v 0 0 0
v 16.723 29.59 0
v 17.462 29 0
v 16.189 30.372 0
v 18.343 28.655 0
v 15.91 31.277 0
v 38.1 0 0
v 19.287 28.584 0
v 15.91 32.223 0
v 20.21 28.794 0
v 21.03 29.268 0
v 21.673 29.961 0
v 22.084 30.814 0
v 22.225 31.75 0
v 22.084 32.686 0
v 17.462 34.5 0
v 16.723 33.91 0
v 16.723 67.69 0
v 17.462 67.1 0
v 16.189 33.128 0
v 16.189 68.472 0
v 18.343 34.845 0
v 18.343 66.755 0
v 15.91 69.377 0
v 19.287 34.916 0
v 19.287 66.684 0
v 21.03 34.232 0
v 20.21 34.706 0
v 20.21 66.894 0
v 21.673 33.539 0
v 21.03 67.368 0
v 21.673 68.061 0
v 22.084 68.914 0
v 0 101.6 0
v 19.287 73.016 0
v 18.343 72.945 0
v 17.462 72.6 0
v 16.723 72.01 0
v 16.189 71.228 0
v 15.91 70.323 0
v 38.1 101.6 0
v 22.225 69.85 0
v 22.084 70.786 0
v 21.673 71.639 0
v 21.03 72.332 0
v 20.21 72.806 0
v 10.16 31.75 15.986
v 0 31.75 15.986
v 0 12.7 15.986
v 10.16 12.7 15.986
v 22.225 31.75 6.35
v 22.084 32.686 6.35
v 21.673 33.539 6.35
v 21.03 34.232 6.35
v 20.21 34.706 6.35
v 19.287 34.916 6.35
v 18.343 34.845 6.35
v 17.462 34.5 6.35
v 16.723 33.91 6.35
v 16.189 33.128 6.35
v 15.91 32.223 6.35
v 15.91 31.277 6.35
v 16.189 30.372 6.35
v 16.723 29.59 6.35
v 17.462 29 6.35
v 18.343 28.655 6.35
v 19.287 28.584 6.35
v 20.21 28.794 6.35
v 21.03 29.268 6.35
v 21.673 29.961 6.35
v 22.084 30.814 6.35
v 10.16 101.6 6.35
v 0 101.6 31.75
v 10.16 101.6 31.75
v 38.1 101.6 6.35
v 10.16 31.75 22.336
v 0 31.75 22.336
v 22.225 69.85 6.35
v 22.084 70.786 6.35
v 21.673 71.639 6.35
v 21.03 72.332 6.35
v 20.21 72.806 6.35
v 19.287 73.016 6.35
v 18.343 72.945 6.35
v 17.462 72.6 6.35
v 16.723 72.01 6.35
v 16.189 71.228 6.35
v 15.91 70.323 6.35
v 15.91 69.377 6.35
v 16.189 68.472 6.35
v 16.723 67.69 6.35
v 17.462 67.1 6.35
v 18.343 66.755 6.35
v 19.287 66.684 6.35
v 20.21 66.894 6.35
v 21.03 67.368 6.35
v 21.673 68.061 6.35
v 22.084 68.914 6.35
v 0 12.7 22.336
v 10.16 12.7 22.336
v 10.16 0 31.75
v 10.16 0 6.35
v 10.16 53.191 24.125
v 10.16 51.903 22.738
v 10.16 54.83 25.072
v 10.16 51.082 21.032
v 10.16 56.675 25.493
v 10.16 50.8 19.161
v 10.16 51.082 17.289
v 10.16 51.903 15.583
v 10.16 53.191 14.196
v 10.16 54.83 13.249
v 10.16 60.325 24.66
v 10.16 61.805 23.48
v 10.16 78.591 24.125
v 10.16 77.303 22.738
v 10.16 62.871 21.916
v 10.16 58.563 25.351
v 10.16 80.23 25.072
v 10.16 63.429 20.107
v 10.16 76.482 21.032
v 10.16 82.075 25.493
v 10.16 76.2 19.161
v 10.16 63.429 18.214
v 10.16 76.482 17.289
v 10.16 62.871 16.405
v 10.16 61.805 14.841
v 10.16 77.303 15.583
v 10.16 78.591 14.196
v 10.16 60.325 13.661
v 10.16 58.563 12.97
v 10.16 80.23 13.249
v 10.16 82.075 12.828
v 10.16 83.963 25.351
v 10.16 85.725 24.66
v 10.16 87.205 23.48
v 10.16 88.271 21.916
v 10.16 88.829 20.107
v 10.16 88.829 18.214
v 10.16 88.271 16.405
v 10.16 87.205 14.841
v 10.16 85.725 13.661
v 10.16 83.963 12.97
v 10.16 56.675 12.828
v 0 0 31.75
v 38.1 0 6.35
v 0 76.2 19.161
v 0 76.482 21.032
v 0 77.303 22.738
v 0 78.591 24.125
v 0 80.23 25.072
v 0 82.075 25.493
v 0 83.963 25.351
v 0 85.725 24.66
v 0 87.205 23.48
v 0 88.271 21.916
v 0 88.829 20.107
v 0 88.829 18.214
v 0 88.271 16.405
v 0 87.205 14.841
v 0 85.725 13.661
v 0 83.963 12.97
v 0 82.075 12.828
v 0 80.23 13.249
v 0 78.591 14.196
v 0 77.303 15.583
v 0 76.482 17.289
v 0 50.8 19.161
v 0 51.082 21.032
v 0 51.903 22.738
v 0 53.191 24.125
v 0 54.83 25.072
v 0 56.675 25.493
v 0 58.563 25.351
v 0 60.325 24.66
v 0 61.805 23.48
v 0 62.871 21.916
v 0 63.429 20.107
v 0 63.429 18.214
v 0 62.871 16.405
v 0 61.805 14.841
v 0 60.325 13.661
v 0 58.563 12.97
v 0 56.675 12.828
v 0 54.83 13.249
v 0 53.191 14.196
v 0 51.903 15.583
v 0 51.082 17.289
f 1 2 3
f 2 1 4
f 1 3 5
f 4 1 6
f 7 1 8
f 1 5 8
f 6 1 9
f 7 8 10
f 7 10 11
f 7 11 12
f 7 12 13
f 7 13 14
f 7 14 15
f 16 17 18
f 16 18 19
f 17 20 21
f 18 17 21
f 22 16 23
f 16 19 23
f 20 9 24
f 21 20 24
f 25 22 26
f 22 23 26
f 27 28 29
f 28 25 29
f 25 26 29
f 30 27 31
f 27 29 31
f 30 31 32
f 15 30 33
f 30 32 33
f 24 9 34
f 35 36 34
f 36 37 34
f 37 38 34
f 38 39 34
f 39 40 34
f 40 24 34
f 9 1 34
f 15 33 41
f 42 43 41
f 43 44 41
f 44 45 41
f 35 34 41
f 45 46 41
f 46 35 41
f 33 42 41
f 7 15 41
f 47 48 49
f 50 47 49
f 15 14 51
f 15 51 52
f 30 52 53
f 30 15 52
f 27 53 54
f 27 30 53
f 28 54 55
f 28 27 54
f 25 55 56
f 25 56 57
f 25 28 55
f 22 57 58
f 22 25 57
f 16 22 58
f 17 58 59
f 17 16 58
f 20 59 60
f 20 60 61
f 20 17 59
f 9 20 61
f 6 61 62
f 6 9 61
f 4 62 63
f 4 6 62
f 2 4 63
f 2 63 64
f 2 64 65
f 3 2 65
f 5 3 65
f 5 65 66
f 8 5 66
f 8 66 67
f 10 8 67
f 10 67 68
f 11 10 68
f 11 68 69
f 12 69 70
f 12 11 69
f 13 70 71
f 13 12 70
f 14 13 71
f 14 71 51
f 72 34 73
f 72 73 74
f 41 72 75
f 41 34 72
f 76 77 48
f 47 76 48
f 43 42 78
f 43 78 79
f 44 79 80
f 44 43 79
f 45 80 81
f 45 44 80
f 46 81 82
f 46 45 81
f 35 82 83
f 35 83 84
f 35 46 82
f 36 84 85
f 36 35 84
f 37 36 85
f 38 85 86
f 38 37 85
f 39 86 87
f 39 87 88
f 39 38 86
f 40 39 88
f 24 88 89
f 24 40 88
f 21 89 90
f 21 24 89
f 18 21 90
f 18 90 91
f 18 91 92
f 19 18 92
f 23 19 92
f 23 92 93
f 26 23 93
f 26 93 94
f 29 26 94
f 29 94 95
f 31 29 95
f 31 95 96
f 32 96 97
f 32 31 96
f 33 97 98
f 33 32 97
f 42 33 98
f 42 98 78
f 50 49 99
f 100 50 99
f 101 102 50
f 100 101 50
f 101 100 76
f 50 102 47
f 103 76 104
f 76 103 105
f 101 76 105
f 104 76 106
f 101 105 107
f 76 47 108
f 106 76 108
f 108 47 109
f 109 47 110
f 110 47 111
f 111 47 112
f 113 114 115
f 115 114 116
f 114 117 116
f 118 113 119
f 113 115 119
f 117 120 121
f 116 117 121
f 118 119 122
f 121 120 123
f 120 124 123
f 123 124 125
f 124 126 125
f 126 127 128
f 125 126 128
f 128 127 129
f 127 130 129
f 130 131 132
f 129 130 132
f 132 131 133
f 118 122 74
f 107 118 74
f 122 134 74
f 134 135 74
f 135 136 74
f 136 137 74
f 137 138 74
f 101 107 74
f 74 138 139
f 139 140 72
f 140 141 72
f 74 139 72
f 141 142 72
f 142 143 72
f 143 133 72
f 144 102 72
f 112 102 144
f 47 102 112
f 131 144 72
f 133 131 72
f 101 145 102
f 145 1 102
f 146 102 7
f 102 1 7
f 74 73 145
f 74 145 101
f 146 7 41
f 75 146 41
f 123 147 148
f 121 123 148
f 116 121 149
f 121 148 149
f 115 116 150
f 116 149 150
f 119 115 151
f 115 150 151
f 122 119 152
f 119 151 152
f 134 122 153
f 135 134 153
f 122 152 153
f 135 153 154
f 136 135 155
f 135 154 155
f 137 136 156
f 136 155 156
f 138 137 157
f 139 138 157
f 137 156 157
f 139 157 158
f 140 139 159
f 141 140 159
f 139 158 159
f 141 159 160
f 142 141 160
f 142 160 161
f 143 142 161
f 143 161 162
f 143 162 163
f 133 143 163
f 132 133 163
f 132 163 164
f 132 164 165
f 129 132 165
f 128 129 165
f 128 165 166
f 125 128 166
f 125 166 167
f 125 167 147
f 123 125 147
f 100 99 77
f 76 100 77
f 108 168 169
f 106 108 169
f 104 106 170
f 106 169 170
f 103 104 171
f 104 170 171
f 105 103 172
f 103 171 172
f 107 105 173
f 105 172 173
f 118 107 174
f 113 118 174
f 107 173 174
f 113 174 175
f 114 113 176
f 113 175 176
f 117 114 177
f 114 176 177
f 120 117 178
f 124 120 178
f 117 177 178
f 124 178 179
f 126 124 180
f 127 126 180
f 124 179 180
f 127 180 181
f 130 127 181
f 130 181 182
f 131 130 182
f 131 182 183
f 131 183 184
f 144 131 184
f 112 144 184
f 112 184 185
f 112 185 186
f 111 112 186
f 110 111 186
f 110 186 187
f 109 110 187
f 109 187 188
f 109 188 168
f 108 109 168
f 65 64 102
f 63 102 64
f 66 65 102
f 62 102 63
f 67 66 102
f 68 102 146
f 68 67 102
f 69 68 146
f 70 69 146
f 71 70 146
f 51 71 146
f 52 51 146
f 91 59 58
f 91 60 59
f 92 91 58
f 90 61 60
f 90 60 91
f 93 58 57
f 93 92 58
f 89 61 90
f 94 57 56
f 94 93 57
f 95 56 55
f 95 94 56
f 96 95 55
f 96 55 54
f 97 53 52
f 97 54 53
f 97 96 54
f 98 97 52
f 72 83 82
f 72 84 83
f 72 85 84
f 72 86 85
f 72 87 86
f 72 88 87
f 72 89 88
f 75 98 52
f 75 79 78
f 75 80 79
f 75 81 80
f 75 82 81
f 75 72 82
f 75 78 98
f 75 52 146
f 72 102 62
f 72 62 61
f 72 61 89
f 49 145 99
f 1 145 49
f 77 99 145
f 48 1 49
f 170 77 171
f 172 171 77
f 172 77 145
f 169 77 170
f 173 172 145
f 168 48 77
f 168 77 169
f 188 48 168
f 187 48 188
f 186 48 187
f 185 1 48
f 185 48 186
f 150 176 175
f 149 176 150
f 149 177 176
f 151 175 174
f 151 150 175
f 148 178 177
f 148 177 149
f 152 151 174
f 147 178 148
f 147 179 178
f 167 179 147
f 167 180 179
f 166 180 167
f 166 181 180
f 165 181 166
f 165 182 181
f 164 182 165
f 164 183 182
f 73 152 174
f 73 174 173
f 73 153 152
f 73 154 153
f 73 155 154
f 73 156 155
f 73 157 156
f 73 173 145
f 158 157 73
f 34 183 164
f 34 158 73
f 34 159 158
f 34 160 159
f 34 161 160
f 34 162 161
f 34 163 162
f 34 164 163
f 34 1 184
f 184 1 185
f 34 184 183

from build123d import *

# Parameters (mm, degrees)
F0_W     = 38.1
F0_H     = 101.6
F0_R     = 3.175
F1_DEPTH = 6.35
F2_W     = 10.16
F2_H     = 101.6
F3_DEPTH = 25.4
F4_R     = 6.35
F5_DEPTH = 25.4


with BuildPart() as f1:
    # F0 (on Top) → F1 (new body)
    with BuildSketch(Plane.XY):
        with Locations((19.05, 50.8)):
            Rectangle(F0_W, F0_H)
        with Locations((19.05, 31.75)):
            Circle(F0_R, mode=Mode.SUBTRACT)
        with Locations((19.05, 69.85)):
            Circle(F0_R, mode=Mode.SUBTRACT)
    extrude(amount=F1_DEPTH)

    # F2 (on face) → F3 (join)
    with BuildSketch(Plane.XY.offset(6.35)):
        with Locations((5.08, 50.8)):
            Rectangle(F2_W, F2_H)
    extrude(amount=F3_DEPTH)

    # F4 (on face) → F5 (cut)
    with BuildSketch(Plane(origin=(0, 0, 0), x_dir=(0, -1, 0), z_dir=(-1, 0, 0))):
        with Locations((-82.55, 19.160531)):
            Circle(F4_R)
        with Locations((-57.15, 19.160531)):
            Circle(F4_R)
        Polygon((-31.75, 19.160531), (-31.75, 15.985531), (-12.7, 15.985531), (-12.7, 19.160531), (-12.7, 22.335531), (-31.75, 22.335531), align=None)
    extrude(amount=-F5_DEPTH, mode=Mode.SUBTRACT)


solid = f1.part
